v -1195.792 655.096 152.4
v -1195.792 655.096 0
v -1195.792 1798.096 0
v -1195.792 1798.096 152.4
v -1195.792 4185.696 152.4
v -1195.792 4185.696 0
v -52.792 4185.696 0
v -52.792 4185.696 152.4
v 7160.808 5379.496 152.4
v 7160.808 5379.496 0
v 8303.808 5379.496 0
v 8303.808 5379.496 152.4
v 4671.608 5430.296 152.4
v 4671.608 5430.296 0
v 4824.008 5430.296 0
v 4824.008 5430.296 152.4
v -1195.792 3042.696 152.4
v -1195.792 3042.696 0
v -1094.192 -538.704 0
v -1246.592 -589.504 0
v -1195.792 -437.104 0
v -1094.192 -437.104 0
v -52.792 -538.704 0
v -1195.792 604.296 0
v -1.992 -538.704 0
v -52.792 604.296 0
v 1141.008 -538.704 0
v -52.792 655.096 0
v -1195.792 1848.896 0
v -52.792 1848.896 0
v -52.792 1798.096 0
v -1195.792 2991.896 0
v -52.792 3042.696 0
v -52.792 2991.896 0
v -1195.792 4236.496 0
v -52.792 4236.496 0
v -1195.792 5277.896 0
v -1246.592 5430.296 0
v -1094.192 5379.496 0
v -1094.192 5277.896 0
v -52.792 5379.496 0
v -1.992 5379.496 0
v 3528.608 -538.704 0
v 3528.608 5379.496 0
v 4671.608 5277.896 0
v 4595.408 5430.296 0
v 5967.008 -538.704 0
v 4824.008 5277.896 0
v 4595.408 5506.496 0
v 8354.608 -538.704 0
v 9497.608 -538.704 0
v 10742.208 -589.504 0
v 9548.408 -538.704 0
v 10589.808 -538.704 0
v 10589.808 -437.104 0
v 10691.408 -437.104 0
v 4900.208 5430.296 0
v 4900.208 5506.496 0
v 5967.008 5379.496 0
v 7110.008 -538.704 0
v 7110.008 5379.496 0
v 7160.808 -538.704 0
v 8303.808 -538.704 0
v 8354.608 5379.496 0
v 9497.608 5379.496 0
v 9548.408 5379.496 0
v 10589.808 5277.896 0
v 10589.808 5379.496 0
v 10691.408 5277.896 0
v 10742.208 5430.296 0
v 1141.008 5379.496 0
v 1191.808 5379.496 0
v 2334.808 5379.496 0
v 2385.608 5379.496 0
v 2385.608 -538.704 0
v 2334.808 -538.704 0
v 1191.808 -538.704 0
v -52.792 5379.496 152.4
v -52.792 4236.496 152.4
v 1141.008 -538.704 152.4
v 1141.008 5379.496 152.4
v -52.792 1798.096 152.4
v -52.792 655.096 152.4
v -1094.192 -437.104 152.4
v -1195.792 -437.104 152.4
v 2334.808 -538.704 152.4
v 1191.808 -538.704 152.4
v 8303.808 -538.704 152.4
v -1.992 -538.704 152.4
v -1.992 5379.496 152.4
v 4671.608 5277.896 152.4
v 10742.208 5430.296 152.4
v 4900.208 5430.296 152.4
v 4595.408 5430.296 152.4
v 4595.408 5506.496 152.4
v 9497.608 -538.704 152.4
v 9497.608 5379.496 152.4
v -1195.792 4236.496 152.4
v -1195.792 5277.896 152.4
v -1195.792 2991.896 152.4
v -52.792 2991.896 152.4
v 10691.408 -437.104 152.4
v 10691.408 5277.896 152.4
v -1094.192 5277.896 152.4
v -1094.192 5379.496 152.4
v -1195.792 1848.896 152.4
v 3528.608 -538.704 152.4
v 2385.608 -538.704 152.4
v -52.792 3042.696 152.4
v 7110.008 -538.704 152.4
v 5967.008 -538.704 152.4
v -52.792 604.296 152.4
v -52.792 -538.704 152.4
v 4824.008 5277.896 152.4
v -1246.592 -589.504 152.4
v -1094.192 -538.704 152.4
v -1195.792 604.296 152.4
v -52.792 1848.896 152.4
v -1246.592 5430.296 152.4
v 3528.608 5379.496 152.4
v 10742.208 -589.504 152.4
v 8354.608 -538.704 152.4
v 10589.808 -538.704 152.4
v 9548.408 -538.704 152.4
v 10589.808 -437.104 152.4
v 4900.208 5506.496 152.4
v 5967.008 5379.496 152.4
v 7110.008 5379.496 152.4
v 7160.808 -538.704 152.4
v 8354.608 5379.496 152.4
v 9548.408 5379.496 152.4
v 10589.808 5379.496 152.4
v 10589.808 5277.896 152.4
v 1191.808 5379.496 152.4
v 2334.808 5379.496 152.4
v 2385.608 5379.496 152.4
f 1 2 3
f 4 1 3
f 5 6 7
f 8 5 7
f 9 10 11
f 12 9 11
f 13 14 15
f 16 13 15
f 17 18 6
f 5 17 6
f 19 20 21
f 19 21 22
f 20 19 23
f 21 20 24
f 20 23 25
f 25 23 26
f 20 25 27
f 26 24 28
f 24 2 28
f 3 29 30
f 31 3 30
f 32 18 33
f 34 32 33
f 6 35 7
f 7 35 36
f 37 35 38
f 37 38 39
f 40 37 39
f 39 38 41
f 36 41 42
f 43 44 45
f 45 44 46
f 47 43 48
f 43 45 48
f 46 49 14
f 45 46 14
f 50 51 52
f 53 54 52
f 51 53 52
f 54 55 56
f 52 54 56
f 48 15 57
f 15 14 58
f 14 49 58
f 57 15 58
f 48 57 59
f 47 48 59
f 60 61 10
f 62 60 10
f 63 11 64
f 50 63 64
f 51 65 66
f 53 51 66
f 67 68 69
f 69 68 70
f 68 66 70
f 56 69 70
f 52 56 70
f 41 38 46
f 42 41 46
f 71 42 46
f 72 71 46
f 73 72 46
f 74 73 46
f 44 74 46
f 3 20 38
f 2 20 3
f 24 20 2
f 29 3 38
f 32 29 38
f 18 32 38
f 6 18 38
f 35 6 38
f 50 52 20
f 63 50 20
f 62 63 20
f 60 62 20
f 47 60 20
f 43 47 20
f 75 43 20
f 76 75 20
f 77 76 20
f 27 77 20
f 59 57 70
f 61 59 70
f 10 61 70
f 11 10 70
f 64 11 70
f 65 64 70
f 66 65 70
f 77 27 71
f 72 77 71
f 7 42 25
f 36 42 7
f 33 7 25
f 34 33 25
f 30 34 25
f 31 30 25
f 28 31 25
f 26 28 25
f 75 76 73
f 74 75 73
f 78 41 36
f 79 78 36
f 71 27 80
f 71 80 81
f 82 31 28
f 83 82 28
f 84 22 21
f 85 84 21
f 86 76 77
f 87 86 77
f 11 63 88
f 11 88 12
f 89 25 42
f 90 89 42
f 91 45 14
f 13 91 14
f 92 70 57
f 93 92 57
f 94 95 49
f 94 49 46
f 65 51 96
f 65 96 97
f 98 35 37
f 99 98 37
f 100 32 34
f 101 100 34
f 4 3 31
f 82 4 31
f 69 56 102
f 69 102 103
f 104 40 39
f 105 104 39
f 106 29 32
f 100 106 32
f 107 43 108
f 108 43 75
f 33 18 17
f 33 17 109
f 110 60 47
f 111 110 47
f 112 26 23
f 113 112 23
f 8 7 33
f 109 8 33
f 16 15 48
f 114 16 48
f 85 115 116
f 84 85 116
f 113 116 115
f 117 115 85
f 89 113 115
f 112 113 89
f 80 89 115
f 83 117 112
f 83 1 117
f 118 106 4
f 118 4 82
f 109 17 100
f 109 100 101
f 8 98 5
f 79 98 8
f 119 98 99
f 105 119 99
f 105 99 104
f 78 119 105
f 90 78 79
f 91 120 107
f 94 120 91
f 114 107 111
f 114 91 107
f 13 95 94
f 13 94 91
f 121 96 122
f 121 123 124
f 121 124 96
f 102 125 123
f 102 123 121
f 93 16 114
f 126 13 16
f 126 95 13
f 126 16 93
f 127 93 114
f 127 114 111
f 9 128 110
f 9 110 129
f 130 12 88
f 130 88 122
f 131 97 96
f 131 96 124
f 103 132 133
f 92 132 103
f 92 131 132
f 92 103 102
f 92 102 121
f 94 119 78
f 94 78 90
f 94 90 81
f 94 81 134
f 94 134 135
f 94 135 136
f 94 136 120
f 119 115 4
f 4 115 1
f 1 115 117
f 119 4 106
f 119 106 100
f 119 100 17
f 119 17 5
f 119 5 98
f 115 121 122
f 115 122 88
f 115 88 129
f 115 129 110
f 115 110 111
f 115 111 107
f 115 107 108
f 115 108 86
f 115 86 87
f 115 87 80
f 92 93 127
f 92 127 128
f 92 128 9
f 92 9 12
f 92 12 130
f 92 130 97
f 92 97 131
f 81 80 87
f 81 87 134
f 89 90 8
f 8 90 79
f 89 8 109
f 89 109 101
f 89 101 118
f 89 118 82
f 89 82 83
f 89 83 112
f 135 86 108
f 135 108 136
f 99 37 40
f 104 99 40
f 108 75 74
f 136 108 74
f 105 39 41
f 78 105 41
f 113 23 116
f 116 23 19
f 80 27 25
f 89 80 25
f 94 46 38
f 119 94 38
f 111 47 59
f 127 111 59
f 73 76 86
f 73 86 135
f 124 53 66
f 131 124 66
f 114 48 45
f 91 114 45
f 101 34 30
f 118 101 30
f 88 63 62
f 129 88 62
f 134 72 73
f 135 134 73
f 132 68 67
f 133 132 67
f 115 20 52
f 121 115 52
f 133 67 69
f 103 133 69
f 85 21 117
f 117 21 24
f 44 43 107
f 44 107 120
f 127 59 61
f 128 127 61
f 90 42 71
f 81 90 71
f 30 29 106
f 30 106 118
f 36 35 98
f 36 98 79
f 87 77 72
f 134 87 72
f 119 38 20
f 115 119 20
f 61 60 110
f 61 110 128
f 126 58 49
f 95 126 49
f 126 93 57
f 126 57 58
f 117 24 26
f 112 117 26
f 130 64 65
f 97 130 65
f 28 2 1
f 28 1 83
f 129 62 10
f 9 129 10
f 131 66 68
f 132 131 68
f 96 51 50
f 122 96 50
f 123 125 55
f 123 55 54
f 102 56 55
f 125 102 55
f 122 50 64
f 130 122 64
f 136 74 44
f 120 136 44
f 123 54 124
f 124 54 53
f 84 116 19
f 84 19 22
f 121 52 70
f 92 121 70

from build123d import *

# Parameters (mm, degrees)
F0_W     = 50.8
F0_H     = 5918.2
F0_W_2   = 1143
F0_H_2   = 50.8
F0_W_3   = 76.2
F0_H_3   = 5740.4
F0_H_4   = 76.2
F0_H_5   = 5715
F1_DEPTH = 152.4


# Not quite as in the source:
# - a feature names something its author has since deleted; it is built from what else it names


with BuildPart() as f1:
    # F0 (on Top) → F1 (new body)
    with BuildSketch(Plane.XY):
        Polygon((-1.9920532227, 5379.496395874), (1141.0079467773, 5379.496395874), (1191.8079467773, 5379.496395874), (2334.8079467773, 5379.496395874), (2385.6079467774, 5379.496395874), (3528.6079467773, 5379.496395874), (3579.4079467774, 5379.496395874), (4595.4079467774, 5379.496395874), (4595.4079467774, 5430.296395874), (-1094.1920532227, 5430.296395874), (-1094.1920532227, 5379.496395874), (-52.7920532227, 5379.496395874), align=None)
        with Locations((1166.4079467773, 2420.396395874)):
            Rectangle(F0_W, F0_H)
        Polygon((1191.8079467773, -538.703604126), (1141.0079467773, -538.703604126), (-1.9920532227, -538.703604126), (-52.7920532227, -538.703604126), (-1094.1920532227, -538.703604126), (-1094.1920532227, -589.503604126), (10589.8079467774, -589.503604126), (10589.8079467774, -538.703604126), (9548.4079467774, -538.703604126), (9497.6079467774, -538.703604126), (8354.6079467774, -538.703604126), (8303.8079467774, -538.703604126), (7160.8079467774, -538.703604126), (7110.0079467774, -538.703604126), (5967.0079467774, -538.703604126), (5916.2079467774, -538.703604126), (4773.2079467774, -538.703604126), (4722.4079467774, -538.703604126), (3579.4079467774, -538.703604126), (3528.6079467774, -538.703604126), (2385.6079467774, -538.703604126), (2334.8079467773, -538.703604126), align=None)
        Polygon((-1.9920532227, -538.703604126), (-1.9920532227, 5379.496395874), (-52.7920532227, 5379.496395874), (-52.7920532227, 4236.496395874), (-52.7920532227, 4185.696395874), (-52.7920532227, 3042.696395874), (-52.7920532227, 2991.896395874), (-52.7920532227, 1848.896395874), (-52.7920532227, 1798.096395874), (-52.7920532227, 655.096395874), (-52.7920532227, 604.296395874), (-52.7920532227, -538.703604126), align=None)
        with Locations((2360.2079467773, 2420.396395874)):
            Rectangle(F0_W, F0_H)
        with Locations((-624.2920532227, 4211.096395874)):
            Rectangle(F0_W_2, F0_H_2)
        Polygon((-1094.1920532227, 5277.896395874), (-1094.1920532227, 5379.496395874), (-1094.1920532227, 5430.296395874), (-1246.5920532227, 5430.296395874), (-1246.5920532227, 5277.896395874), (-1195.7920532227, 5277.896395874), align=None)
        with Locations((3554.0079467774, 2420.396395874)):
            Rectangle(F0_W, F0_H)
        with Locations((-624.2920532227, 629.696395874)):
            Rectangle(F0_W_2, F0_H_2)
        Polygon((-1094.1920532227, -589.503604126), (-1094.1920532227, -538.703604126), (-1094.1920532227, -437.103604126), (-1195.7920532227, -437.103604126), (-1246.5920532227, -437.103604126), (-1246.5920532227, -589.503604126), align=None)
        Polygon((-1195.7920532227, 4185.696395874), (-1195.7920532227, 4236.496395874), (-1195.7920532227, 5277.896395874), (-1246.5920532227, 5277.896395874), (-1246.5920532227, -437.103604126), (-1195.7920532227, -437.103604126), (-1195.7920532227, 604.296395874), (-1195.7920532227, 655.096395874), (-1195.7920532227, 1798.096395874), (-1195.7920532227, 1848.896395874), (-1195.7920532227, 2991.896395874), (-1195.7920532227, 3042.696395874), align=None)
        Polygon((4595.4079467774, 5379.496395874), (3579.4079467774, 5379.496395874), (3579.4079467774, -538.703604126), (4722.4079467774, -538.703604126), (4722.4079467774, 5201.696395874), (4595.4079467774, 5201.696395874), align=None)
        with Locations((-624.2920532227, 3017.296395874)):
            Rectangle(F0_W_2, F0_H_2)
        Polygon((4595.4079467774, 5506.496395874), (4595.4079467774, 5430.296395874), (4671.6079467774, 5430.296395874), (4824.0079467774, 5430.296395874), (4900.2079467774, 5430.296395874), (4900.2079467774, 5506.496395874), align=None)
        with Locations((4633.5079467774, 5404.896395874)):
            Rectangle(F0_W_3, F0_H_2)
        Polygon((4671.6079467774, 5379.496395874), (4595.4079467774, 5379.496395874), (4595.4079467774, 5201.696395874), (4722.4079467774, 5201.696395874), (4722.4079467774, 5277.896395874), (4671.6079467774, 5277.896395874), align=None)
        with Locations((-624.2920532227, 1823.496395874)):
            Rectangle(F0_W_2, F0_H_2)
        Polygon((10589.8079467774, -538.703604126), (10589.8079467774, -589.503604126), (10742.2079467774, -589.503604126), (10742.2079467774, -437.103604126), (10691.4079467774, -437.103604126), (10589.8079467774, -437.103604126), align=None)
        with Locations((4747.8079467774, 2331.496395874)):
            Rectangle(F0_W, F0_H_3)
        with Locations((4862.1079467774, 5404.896395874)):
            Rectangle(F0_W_3, F0_H_2)
        Polygon((4773.2079467774, 5201.696395874), (4773.2079467774, -538.703604126), (5916.2079467774, -538.703604126), (5916.2079467774, 5379.496395874), (4900.2079467774, 5379.496395874), (4900.2079467774, 5201.696395874), align=None)
        with Locations((4747.8079467774, 5239.796395874)):
            Rectangle(F0_W, F0_H_4)
        with Locations((9523.0079467774, 2420.396395874)):
            Rectangle(F0_W, F0_H)
        with Locations((10716.8079467774, 2420.396395874)):
            Rectangle(F0_W, F0_H_5)
        Polygon((10589.8079467774, 5430.296395874), (4900.2079467774, 5430.296395874), (4900.2079467774, 5379.496395874), (5916.2079467774, 5379.496395874), (5967.0079467774, 5379.496395874), (7110.0079467774, 5379.496395874), (7160.8079467774, 5379.496395874), (8303.8079467774, 5379.496395874), (8354.6079467774, 5379.496395874), (9497.6079467774, 5379.496395874), (9548.4079467774, 5379.496395874), (10589.8079467774, 5379.496395874), align=None)
        Polygon((4900.2079467774, 5379.496395874), (4824.0079467774, 5379.496395874), (4824.0079467774, 5277.896395874), (4773.2079467774, 5277.896395874), (4773.2079467774, 5201.696395874), (4900.2079467774, 5201.696395874), align=None)
        with Locations((5941.6079467774, 2420.396395874)):
            Rectangle(F0_W, F0_H)
        Polygon((10691.4079467774, 5277.896395874), (10742.2079467774, 5277.896395874), (10742.2079467774, 5430.296395874), (10589.8079467774, 5430.296395874), (10589.8079467774, 5379.496395874), (10589.8079467774, 5277.896395874), align=None)
        with Locations((8329.2079467774, 2420.396395874)):
            Rectangle(F0_W, F0_H)
        with Locations((7135.4079467774, 2420.396395874)):
            Rectangle(F0_W, F0_H)
    extrude(amount=F1_DEPTH)


solid = f1.part
